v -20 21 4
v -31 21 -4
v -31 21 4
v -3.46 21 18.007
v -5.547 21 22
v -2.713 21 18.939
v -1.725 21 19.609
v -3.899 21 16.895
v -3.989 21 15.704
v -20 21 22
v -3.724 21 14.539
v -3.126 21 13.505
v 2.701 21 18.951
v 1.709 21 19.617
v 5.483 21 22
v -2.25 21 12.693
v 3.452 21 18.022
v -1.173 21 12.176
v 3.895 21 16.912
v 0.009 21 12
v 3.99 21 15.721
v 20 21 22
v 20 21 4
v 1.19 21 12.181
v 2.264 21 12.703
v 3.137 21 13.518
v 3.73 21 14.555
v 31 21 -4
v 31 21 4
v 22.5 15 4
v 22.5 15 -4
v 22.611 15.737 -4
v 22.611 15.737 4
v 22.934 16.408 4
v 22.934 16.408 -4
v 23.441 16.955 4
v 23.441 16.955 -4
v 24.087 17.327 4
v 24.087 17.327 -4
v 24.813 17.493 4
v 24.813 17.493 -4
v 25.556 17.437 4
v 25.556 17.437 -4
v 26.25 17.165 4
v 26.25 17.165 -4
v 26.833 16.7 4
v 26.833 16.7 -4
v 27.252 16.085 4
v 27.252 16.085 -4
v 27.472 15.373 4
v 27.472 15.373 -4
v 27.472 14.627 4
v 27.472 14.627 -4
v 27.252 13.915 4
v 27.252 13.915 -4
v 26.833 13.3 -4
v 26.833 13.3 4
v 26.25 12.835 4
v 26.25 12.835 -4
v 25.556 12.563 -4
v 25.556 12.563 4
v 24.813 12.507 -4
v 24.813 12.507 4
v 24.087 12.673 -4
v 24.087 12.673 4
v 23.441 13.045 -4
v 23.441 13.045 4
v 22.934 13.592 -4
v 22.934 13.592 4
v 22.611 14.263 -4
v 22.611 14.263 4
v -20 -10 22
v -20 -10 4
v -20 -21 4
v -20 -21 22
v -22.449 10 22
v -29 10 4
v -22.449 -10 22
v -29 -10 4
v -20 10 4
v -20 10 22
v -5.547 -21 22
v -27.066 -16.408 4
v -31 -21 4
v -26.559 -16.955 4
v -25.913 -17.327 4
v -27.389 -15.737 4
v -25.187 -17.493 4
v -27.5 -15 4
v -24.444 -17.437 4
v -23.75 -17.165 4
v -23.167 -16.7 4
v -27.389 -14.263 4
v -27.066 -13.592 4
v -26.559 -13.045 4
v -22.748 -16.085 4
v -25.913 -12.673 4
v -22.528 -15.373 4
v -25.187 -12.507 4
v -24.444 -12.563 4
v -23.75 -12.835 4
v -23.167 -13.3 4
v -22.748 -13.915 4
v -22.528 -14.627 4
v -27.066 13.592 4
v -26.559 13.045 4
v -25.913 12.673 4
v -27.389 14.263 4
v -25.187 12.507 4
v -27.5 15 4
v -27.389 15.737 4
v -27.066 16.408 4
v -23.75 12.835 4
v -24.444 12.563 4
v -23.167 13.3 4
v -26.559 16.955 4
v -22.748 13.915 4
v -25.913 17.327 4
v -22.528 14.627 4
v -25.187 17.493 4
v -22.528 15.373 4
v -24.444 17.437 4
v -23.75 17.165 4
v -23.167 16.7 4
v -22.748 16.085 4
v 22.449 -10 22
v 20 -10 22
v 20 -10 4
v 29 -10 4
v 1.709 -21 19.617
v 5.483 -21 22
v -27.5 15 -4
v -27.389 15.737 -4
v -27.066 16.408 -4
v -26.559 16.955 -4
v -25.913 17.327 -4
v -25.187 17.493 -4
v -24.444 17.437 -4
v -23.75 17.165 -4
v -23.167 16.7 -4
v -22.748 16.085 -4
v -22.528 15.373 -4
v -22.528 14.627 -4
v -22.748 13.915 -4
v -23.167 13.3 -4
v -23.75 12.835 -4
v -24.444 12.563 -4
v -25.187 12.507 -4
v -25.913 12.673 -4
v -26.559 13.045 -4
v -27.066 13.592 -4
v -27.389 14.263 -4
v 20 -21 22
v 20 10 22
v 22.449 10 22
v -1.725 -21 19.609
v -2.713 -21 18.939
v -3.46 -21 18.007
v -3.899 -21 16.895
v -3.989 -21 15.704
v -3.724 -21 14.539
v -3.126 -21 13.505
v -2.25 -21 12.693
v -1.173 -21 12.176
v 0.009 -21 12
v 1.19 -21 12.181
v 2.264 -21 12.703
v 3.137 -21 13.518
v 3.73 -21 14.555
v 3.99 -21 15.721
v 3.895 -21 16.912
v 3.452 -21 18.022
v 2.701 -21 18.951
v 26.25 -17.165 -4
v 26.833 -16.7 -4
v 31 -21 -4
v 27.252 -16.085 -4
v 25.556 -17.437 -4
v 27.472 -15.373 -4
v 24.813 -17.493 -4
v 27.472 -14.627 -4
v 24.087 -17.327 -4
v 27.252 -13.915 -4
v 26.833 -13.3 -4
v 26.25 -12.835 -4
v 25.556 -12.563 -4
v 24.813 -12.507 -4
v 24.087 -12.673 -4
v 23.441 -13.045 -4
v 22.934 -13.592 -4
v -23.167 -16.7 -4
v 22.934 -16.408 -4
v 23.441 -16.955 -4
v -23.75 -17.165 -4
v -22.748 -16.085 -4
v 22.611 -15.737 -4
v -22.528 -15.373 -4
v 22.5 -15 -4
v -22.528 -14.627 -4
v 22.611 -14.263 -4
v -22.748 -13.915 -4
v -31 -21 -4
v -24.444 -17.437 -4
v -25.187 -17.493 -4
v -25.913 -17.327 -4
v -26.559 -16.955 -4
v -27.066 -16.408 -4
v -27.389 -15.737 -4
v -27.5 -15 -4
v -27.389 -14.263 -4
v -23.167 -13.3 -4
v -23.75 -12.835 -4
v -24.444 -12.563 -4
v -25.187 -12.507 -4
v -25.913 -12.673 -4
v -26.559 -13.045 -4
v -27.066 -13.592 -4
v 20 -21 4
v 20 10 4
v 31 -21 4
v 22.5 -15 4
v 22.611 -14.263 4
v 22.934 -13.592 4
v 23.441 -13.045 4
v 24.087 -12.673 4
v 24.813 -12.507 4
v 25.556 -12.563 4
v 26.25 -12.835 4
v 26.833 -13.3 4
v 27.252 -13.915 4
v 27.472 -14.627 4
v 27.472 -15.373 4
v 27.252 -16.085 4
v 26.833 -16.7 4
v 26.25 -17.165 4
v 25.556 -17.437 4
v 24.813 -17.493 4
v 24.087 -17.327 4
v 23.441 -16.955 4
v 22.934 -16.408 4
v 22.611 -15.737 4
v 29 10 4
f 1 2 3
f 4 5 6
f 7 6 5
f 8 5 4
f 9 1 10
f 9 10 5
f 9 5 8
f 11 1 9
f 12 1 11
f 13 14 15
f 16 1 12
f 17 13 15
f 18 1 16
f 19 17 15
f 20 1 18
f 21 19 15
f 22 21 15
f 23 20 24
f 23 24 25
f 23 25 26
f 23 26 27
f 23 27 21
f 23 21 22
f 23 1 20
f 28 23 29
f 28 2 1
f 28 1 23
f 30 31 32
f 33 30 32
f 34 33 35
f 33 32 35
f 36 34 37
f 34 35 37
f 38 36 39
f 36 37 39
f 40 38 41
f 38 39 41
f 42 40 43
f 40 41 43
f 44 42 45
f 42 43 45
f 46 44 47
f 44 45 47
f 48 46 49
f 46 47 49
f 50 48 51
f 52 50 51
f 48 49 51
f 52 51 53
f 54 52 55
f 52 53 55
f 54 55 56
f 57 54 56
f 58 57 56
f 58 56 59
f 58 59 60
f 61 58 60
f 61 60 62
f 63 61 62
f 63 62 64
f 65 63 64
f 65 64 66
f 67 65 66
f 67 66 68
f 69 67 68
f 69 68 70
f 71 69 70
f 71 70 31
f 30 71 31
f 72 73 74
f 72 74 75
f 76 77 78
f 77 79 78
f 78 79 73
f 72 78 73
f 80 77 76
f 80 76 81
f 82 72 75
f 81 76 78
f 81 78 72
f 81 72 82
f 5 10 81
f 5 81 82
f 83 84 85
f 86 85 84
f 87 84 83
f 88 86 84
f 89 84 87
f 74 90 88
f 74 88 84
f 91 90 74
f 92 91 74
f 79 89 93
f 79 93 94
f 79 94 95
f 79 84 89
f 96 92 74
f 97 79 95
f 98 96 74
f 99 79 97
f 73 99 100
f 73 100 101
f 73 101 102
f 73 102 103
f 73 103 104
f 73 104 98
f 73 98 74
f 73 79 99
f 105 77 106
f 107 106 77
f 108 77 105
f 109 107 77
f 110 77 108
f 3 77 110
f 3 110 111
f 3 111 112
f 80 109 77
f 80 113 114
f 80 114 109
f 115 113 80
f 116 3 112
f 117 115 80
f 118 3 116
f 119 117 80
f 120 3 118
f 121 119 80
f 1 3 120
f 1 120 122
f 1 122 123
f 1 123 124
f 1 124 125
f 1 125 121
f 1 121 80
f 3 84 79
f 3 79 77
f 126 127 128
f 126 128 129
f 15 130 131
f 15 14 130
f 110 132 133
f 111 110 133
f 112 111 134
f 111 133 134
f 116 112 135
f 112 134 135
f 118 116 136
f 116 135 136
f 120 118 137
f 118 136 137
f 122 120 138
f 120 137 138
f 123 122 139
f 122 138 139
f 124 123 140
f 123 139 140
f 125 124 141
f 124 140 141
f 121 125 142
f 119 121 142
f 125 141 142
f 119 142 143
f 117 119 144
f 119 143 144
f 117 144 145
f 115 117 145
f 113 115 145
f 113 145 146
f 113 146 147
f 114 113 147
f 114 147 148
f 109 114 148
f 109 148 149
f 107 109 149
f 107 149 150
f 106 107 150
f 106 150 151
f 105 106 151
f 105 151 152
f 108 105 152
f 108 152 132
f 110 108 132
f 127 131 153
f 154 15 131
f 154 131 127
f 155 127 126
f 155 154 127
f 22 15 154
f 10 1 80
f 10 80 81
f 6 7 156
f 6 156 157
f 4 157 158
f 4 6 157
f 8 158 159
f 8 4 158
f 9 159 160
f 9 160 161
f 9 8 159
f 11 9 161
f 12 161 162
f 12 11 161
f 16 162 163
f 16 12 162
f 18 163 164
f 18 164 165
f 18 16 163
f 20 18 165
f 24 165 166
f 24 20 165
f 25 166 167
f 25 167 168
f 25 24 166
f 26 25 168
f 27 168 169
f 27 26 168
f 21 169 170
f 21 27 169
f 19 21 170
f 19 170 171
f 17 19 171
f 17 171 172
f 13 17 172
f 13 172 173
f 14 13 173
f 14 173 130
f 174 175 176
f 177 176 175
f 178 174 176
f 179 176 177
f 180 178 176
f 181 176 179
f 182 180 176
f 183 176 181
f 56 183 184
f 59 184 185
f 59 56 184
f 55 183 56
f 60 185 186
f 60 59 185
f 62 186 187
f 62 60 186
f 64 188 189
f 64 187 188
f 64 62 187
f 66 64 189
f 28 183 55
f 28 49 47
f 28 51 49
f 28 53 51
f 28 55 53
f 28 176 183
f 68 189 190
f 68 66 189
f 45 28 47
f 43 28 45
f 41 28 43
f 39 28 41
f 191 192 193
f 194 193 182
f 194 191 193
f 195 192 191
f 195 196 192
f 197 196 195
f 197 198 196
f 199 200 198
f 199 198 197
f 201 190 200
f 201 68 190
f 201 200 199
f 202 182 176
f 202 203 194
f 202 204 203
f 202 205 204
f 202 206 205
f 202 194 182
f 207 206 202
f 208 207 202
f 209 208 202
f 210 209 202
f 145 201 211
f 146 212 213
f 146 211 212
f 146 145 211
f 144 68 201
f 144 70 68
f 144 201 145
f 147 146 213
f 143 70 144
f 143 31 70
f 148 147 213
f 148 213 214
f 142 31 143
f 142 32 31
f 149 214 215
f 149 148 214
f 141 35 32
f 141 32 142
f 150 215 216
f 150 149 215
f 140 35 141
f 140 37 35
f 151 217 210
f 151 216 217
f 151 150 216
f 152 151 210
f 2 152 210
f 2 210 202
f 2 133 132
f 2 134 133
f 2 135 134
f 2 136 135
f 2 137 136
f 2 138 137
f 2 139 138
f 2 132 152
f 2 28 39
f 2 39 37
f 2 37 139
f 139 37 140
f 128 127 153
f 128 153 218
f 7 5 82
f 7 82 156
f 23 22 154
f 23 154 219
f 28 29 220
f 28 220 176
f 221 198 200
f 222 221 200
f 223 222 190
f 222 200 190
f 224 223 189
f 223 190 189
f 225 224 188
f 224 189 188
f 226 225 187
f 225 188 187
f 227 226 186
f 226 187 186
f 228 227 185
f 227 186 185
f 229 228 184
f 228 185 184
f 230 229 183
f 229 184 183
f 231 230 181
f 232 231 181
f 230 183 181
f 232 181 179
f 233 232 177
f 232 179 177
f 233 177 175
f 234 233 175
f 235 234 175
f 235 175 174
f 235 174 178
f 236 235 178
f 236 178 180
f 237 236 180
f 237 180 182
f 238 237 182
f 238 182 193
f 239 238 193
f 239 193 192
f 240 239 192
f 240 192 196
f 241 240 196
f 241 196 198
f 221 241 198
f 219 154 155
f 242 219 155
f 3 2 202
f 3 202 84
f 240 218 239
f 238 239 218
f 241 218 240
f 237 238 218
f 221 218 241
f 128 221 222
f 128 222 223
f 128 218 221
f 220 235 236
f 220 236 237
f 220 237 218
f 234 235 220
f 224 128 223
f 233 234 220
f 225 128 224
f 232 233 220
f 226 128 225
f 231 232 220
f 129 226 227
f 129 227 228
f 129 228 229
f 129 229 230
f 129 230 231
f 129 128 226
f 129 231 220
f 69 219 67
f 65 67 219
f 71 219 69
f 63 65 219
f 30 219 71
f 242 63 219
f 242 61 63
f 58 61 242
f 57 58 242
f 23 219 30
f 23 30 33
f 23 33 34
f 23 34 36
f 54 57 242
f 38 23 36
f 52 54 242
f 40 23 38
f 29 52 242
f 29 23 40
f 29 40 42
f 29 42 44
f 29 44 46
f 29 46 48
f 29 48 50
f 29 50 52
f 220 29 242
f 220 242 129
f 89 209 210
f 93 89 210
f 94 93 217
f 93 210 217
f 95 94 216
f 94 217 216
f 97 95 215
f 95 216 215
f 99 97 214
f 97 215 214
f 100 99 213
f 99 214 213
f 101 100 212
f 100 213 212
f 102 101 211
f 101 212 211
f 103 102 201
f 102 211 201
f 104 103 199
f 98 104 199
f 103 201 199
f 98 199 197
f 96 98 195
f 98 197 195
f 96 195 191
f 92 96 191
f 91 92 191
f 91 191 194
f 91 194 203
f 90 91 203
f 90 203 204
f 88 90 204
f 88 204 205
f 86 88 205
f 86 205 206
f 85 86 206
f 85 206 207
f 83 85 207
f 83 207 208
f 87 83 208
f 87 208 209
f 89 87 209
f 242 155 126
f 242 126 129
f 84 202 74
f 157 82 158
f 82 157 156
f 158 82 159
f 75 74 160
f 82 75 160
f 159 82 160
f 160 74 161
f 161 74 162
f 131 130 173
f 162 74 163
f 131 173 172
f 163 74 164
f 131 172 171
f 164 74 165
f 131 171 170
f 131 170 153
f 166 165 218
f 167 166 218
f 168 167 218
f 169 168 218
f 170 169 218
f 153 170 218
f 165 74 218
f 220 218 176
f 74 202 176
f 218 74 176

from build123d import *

# Parameters (mm, degrees)
EXTRUDE1_DEPTH        = 21
EXTRUDE1_DEPTH_BACK   = 21
EXTRUDE2_DEPTH        = 10
EXTRUDE2_DEPTH_BACK   = 10
CORTAR_EXTRUIR1_REACH = 47.585
CROQUIS1_R            = 2.5


with BuildPart() as part:
    # Sketch1 → Extrude1 (new, two sides: drawn at the far end of the back side and taken through both)
    with BuildSketch(Plane(origin=(0, 0, 0), x_dir=(1, 0, 0), z_dir=(0, 1, 0)).offset(-EXTRUDE1_DEPTH_BACK)):
        with BuildLine():
            Line((20, -22), (20, -4))
            Line((20, -4), (29, -4))
            Line((29, -4), (31, -4))
            Line((31, -4), (31, 4))
            Line((31, 4), (-31, 4))
            Line((-31, 4), (-31, -4))
            Line((-31, -4), (-29, -4))
            Line((-29, -4), (-20, -4))
            Line((-20, -4), (-20, -22))
            Line((-20, -22), (-5.546820257, -22))
            Line((-5.546820257, -22), (-1.724579107, -19.609131046))
            ThreePointArc((-1.724579107, -19.609131046), (0.008719361, -12.000009503), (1.708828096, -19.616615343))
            Line((1.708828096, -19.616615343), (5.482961188, -22))
            Line((5.482961188, -22), (20, -22))
        make_face()
    extrude(amount=EXTRUDE1_DEPTH + EXTRUDE1_DEPTH_BACK)

    # Sketch1<8> → Extrude2 (add, two sides: drawn at the far end of the back side and taken through both)
    with BuildSketch(Plane(origin=(0, 0, 0), x_dir=(1, 0, 0), z_dir=(0, 1, 0)).offset(-EXTRUDE2_DEPTH_BACK)):
        Polygon((29, -4), (20, -4), (20, -22), (22.448535783, -22), align=None)
        Polygon((-20, -4), (-29, -4), (-22.448535783, -22), (-20, -22), align=None)
    extrude(amount=EXTRUDE2_DEPTH + EXTRUDE2_DEPTH_BACK)

    # Croquis1 → Cortar-Extruir1 (cut, up to next)
    with BuildSketch(Plane(origin=(0, 0, -4), x_dir=(-1, 0, 0), z_dir=(0, 0, -1)), mode=Mode.PRIVATE) as cortar_extruir1_sk1:
        with Locations((-25, 15)):
            Circle(CROQUIS1_R)
    cortar_extruir1_tool1 = extrude(cortar_extruir1_sk1.sketch, amount=-CORTAR_EXTRUIR1_REACH, mode=Mode.PRIVATE) & part.part
    # Croquis1 → Cortar-Extruir1 (cut, up to next)
    with BuildSketch(Plane(origin=(0, 0, -4), x_dir=(-1, 0, 0), z_dir=(0, 0, -1)), mode=Mode.PRIVATE) as cortar_extruir1_sk2:
        with Locations((25, 15)):
            Circle(CROQUIS1_R)
    cortar_extruir1_tool2 = extrude(cortar_extruir1_sk2.sketch, amount=-CORTAR_EXTRUIR1_REACH, mode=Mode.PRIVATE) & part.part
    # Croquis1 → Cortar-Extruir1 (cut, up to next)
    with BuildSketch(Plane(origin=(0, 0, -4), x_dir=(-1, 0, 0), z_dir=(0, 0, -1)), mode=Mode.PRIVATE) as cortar_extruir1_sk3:
        with Locations((-25, -15)):
            Circle(CROQUIS1_R)
    cortar_extruir1_tool3 = extrude(cortar_extruir1_sk3.sketch, amount=-CORTAR_EXTRUIR1_REACH, mode=Mode.PRIVATE) & part.part
    # Croquis1 → Cortar-Extruir1 (cut, up to next)
    with BuildSketch(Plane(origin=(0, 0, -4), x_dir=(-1, 0, 0), z_dir=(0, 0, -1)), mode=Mode.PRIVATE) as cortar_extruir1_sk4:
        with Locations((25, -15)):
            Circle(CROQUIS1_R)
    cortar_extruir1_tool4 = extrude(cortar_extruir1_sk4.sketch, amount=-CORTAR_EXTRUIR1_REACH, mode=Mode.PRIVATE) & part.part
    add(cortar_extruir1_tool1.solids().sort_by_distance((25, 15, -4))[0], mode=Mode.SUBTRACT)
    add(cortar_extruir1_tool2.solids().sort_by_distance((-25, 15, -4))[0], mode=Mode.SUBTRACT)
    add(cortar_extruir1_tool3.solids().sort_by_distance((25, -15, -4))[0], mode=Mode.SUBTRACT)
    add(cortar_extruir1_tool4.solids().sort_by_distance((-25, -15, -4))[0], mode=Mode.SUBTRACT)


solid = part.part
